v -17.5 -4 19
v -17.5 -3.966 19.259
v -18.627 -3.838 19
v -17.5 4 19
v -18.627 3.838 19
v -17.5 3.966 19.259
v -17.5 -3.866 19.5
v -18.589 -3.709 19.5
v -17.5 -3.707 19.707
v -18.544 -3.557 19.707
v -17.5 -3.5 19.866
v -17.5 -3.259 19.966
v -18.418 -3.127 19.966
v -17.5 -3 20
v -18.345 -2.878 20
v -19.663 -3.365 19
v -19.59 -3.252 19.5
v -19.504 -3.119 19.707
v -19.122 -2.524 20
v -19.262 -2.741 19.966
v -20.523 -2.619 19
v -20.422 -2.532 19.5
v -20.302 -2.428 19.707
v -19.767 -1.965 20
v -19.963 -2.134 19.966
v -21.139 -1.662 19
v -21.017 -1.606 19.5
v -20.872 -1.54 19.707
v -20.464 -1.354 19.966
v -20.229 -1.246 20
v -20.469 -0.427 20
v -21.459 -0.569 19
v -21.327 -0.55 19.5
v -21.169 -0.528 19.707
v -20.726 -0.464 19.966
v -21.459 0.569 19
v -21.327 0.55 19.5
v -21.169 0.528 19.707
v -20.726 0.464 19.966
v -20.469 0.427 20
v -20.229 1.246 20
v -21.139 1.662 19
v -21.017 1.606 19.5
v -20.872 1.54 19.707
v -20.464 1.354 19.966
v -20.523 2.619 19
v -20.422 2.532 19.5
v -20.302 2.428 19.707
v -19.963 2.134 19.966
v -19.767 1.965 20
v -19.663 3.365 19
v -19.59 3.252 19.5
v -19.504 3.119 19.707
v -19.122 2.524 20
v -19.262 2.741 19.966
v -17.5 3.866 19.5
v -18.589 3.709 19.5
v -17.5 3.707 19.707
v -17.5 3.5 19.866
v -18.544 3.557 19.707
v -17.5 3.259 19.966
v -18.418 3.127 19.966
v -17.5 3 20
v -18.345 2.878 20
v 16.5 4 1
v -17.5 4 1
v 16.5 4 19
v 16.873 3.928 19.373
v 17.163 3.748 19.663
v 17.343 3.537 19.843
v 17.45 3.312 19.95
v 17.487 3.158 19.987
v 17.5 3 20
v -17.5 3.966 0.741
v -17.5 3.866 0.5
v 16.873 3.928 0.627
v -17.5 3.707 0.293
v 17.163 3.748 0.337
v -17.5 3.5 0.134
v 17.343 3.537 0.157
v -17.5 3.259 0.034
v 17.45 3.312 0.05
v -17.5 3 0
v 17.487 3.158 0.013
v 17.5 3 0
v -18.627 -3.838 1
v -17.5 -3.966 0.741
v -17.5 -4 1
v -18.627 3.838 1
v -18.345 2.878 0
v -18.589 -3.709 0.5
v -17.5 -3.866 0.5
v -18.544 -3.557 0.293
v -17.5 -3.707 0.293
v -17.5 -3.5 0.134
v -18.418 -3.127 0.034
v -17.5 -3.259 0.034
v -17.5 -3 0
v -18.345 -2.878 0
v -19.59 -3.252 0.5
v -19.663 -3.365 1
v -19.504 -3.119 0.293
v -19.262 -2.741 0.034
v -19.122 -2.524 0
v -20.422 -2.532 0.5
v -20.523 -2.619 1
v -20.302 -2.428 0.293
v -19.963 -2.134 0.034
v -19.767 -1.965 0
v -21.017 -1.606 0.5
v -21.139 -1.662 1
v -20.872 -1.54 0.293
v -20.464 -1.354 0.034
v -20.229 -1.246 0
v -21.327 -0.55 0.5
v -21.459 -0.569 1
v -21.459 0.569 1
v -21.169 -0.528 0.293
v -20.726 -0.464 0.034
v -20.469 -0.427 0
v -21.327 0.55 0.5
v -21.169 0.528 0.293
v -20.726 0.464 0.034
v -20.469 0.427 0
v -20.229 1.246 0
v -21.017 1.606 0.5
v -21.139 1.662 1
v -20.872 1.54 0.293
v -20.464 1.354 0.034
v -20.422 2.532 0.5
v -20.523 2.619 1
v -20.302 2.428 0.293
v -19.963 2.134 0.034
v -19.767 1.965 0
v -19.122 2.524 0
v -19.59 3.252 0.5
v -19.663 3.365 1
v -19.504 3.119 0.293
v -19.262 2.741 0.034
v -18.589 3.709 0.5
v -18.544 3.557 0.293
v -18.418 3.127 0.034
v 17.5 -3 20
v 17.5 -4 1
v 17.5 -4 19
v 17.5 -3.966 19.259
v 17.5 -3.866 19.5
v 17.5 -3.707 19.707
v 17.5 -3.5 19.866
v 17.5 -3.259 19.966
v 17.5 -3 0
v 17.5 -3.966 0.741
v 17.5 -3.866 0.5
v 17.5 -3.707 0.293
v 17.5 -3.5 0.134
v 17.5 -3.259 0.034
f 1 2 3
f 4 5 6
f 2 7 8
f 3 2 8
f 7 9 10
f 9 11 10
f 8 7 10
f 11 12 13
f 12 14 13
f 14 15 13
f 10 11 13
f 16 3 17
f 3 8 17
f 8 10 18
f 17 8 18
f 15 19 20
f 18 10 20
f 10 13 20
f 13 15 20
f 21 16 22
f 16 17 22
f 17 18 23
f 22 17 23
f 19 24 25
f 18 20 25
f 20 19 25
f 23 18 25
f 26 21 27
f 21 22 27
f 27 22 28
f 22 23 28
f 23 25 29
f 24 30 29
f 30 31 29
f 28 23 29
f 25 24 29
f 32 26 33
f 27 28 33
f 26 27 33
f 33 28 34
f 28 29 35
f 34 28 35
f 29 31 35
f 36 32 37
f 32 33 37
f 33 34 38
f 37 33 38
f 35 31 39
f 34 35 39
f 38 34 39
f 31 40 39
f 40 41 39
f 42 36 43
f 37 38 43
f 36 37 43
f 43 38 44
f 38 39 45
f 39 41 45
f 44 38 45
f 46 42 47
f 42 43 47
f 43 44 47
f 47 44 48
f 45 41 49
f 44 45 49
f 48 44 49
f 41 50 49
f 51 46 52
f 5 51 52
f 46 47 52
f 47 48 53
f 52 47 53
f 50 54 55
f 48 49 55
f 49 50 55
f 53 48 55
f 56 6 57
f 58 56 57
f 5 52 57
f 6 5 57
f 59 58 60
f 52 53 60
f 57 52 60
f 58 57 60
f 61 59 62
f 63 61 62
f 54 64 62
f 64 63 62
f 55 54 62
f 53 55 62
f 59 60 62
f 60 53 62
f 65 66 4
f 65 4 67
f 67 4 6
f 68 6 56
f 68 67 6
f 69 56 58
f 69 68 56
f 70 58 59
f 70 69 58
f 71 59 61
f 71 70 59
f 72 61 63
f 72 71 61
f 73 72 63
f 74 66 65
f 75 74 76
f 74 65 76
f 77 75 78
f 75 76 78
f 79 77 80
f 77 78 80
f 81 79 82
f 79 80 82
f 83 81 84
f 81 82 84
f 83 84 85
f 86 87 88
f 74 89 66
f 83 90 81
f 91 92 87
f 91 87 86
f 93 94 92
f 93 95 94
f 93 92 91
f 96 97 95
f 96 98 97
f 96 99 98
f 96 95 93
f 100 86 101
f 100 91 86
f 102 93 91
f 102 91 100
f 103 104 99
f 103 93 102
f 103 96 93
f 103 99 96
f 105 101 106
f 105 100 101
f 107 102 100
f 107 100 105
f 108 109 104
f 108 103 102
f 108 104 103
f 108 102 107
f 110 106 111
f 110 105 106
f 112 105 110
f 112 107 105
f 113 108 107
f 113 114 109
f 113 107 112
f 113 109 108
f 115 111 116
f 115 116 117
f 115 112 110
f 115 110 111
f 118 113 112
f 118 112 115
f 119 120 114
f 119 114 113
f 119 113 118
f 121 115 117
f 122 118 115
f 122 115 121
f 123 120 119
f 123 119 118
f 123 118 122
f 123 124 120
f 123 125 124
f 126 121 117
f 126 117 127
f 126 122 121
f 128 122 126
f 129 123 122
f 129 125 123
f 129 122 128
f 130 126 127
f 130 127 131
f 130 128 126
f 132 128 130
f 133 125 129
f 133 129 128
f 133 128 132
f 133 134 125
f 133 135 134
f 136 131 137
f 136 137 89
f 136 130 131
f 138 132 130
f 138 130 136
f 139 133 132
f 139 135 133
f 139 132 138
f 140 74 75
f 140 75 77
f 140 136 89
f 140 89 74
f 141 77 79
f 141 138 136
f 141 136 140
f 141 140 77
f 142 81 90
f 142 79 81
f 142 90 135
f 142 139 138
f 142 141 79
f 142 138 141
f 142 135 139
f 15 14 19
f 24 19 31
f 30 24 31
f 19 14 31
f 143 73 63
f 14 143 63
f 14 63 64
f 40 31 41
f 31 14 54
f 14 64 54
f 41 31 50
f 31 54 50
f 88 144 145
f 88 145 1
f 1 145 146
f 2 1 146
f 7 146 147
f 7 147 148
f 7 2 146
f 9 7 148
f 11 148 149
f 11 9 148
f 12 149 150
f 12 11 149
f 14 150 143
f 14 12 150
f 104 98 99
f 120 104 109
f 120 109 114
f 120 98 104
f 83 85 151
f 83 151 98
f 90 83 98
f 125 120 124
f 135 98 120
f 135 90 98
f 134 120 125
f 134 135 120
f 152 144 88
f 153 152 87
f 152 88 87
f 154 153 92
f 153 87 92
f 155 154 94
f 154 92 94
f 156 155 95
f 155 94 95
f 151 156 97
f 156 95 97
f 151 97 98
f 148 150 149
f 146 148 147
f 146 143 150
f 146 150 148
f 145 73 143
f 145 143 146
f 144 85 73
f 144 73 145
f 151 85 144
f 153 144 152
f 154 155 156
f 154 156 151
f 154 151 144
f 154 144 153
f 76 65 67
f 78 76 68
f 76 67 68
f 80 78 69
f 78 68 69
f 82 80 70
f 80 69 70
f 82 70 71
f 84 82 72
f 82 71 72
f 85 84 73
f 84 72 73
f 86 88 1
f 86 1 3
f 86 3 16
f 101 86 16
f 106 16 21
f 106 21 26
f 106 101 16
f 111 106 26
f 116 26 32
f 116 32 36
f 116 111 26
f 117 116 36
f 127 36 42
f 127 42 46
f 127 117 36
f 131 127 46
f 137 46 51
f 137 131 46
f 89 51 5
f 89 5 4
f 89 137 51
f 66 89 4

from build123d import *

# Parameters (mm, degrees)
EXTRUDE_1_DEPTH = 20
FILLET_1_R      = 1


with BuildPart() as part:
    # Эскиз1 → Бобышка-Вытянуть1 (new body)
    with BuildSketch(Plane.XY):
        with BuildLine():
            Line((17.5, -4), (-17.5, -4))
            ThreePointArc((-17.5, -4), (-21.5, 0), (-17.5, 4))
            Line((-17.5, 4), (17.5, 4))
            Line((17.5, 4), (17.5, -4))
        make_face()
    extrude(amount=EXTRUDE_1_DEPTH)

    # Скругление1
    fillet_1_edges = [part.edges().sort_by_distance(p)[0] for p in [
        (0, 4, 20),
        (-21.5, 0, 20),
        (0, 4, 0),
        (0, -4, 0),
        (-21.5, 0, 0),
        (17.5, 4, 10),
        (0, -4, 20),
    ]]
    fillet(fillet_1_edges, radius=FILLET_1_R)


solid = part.part
